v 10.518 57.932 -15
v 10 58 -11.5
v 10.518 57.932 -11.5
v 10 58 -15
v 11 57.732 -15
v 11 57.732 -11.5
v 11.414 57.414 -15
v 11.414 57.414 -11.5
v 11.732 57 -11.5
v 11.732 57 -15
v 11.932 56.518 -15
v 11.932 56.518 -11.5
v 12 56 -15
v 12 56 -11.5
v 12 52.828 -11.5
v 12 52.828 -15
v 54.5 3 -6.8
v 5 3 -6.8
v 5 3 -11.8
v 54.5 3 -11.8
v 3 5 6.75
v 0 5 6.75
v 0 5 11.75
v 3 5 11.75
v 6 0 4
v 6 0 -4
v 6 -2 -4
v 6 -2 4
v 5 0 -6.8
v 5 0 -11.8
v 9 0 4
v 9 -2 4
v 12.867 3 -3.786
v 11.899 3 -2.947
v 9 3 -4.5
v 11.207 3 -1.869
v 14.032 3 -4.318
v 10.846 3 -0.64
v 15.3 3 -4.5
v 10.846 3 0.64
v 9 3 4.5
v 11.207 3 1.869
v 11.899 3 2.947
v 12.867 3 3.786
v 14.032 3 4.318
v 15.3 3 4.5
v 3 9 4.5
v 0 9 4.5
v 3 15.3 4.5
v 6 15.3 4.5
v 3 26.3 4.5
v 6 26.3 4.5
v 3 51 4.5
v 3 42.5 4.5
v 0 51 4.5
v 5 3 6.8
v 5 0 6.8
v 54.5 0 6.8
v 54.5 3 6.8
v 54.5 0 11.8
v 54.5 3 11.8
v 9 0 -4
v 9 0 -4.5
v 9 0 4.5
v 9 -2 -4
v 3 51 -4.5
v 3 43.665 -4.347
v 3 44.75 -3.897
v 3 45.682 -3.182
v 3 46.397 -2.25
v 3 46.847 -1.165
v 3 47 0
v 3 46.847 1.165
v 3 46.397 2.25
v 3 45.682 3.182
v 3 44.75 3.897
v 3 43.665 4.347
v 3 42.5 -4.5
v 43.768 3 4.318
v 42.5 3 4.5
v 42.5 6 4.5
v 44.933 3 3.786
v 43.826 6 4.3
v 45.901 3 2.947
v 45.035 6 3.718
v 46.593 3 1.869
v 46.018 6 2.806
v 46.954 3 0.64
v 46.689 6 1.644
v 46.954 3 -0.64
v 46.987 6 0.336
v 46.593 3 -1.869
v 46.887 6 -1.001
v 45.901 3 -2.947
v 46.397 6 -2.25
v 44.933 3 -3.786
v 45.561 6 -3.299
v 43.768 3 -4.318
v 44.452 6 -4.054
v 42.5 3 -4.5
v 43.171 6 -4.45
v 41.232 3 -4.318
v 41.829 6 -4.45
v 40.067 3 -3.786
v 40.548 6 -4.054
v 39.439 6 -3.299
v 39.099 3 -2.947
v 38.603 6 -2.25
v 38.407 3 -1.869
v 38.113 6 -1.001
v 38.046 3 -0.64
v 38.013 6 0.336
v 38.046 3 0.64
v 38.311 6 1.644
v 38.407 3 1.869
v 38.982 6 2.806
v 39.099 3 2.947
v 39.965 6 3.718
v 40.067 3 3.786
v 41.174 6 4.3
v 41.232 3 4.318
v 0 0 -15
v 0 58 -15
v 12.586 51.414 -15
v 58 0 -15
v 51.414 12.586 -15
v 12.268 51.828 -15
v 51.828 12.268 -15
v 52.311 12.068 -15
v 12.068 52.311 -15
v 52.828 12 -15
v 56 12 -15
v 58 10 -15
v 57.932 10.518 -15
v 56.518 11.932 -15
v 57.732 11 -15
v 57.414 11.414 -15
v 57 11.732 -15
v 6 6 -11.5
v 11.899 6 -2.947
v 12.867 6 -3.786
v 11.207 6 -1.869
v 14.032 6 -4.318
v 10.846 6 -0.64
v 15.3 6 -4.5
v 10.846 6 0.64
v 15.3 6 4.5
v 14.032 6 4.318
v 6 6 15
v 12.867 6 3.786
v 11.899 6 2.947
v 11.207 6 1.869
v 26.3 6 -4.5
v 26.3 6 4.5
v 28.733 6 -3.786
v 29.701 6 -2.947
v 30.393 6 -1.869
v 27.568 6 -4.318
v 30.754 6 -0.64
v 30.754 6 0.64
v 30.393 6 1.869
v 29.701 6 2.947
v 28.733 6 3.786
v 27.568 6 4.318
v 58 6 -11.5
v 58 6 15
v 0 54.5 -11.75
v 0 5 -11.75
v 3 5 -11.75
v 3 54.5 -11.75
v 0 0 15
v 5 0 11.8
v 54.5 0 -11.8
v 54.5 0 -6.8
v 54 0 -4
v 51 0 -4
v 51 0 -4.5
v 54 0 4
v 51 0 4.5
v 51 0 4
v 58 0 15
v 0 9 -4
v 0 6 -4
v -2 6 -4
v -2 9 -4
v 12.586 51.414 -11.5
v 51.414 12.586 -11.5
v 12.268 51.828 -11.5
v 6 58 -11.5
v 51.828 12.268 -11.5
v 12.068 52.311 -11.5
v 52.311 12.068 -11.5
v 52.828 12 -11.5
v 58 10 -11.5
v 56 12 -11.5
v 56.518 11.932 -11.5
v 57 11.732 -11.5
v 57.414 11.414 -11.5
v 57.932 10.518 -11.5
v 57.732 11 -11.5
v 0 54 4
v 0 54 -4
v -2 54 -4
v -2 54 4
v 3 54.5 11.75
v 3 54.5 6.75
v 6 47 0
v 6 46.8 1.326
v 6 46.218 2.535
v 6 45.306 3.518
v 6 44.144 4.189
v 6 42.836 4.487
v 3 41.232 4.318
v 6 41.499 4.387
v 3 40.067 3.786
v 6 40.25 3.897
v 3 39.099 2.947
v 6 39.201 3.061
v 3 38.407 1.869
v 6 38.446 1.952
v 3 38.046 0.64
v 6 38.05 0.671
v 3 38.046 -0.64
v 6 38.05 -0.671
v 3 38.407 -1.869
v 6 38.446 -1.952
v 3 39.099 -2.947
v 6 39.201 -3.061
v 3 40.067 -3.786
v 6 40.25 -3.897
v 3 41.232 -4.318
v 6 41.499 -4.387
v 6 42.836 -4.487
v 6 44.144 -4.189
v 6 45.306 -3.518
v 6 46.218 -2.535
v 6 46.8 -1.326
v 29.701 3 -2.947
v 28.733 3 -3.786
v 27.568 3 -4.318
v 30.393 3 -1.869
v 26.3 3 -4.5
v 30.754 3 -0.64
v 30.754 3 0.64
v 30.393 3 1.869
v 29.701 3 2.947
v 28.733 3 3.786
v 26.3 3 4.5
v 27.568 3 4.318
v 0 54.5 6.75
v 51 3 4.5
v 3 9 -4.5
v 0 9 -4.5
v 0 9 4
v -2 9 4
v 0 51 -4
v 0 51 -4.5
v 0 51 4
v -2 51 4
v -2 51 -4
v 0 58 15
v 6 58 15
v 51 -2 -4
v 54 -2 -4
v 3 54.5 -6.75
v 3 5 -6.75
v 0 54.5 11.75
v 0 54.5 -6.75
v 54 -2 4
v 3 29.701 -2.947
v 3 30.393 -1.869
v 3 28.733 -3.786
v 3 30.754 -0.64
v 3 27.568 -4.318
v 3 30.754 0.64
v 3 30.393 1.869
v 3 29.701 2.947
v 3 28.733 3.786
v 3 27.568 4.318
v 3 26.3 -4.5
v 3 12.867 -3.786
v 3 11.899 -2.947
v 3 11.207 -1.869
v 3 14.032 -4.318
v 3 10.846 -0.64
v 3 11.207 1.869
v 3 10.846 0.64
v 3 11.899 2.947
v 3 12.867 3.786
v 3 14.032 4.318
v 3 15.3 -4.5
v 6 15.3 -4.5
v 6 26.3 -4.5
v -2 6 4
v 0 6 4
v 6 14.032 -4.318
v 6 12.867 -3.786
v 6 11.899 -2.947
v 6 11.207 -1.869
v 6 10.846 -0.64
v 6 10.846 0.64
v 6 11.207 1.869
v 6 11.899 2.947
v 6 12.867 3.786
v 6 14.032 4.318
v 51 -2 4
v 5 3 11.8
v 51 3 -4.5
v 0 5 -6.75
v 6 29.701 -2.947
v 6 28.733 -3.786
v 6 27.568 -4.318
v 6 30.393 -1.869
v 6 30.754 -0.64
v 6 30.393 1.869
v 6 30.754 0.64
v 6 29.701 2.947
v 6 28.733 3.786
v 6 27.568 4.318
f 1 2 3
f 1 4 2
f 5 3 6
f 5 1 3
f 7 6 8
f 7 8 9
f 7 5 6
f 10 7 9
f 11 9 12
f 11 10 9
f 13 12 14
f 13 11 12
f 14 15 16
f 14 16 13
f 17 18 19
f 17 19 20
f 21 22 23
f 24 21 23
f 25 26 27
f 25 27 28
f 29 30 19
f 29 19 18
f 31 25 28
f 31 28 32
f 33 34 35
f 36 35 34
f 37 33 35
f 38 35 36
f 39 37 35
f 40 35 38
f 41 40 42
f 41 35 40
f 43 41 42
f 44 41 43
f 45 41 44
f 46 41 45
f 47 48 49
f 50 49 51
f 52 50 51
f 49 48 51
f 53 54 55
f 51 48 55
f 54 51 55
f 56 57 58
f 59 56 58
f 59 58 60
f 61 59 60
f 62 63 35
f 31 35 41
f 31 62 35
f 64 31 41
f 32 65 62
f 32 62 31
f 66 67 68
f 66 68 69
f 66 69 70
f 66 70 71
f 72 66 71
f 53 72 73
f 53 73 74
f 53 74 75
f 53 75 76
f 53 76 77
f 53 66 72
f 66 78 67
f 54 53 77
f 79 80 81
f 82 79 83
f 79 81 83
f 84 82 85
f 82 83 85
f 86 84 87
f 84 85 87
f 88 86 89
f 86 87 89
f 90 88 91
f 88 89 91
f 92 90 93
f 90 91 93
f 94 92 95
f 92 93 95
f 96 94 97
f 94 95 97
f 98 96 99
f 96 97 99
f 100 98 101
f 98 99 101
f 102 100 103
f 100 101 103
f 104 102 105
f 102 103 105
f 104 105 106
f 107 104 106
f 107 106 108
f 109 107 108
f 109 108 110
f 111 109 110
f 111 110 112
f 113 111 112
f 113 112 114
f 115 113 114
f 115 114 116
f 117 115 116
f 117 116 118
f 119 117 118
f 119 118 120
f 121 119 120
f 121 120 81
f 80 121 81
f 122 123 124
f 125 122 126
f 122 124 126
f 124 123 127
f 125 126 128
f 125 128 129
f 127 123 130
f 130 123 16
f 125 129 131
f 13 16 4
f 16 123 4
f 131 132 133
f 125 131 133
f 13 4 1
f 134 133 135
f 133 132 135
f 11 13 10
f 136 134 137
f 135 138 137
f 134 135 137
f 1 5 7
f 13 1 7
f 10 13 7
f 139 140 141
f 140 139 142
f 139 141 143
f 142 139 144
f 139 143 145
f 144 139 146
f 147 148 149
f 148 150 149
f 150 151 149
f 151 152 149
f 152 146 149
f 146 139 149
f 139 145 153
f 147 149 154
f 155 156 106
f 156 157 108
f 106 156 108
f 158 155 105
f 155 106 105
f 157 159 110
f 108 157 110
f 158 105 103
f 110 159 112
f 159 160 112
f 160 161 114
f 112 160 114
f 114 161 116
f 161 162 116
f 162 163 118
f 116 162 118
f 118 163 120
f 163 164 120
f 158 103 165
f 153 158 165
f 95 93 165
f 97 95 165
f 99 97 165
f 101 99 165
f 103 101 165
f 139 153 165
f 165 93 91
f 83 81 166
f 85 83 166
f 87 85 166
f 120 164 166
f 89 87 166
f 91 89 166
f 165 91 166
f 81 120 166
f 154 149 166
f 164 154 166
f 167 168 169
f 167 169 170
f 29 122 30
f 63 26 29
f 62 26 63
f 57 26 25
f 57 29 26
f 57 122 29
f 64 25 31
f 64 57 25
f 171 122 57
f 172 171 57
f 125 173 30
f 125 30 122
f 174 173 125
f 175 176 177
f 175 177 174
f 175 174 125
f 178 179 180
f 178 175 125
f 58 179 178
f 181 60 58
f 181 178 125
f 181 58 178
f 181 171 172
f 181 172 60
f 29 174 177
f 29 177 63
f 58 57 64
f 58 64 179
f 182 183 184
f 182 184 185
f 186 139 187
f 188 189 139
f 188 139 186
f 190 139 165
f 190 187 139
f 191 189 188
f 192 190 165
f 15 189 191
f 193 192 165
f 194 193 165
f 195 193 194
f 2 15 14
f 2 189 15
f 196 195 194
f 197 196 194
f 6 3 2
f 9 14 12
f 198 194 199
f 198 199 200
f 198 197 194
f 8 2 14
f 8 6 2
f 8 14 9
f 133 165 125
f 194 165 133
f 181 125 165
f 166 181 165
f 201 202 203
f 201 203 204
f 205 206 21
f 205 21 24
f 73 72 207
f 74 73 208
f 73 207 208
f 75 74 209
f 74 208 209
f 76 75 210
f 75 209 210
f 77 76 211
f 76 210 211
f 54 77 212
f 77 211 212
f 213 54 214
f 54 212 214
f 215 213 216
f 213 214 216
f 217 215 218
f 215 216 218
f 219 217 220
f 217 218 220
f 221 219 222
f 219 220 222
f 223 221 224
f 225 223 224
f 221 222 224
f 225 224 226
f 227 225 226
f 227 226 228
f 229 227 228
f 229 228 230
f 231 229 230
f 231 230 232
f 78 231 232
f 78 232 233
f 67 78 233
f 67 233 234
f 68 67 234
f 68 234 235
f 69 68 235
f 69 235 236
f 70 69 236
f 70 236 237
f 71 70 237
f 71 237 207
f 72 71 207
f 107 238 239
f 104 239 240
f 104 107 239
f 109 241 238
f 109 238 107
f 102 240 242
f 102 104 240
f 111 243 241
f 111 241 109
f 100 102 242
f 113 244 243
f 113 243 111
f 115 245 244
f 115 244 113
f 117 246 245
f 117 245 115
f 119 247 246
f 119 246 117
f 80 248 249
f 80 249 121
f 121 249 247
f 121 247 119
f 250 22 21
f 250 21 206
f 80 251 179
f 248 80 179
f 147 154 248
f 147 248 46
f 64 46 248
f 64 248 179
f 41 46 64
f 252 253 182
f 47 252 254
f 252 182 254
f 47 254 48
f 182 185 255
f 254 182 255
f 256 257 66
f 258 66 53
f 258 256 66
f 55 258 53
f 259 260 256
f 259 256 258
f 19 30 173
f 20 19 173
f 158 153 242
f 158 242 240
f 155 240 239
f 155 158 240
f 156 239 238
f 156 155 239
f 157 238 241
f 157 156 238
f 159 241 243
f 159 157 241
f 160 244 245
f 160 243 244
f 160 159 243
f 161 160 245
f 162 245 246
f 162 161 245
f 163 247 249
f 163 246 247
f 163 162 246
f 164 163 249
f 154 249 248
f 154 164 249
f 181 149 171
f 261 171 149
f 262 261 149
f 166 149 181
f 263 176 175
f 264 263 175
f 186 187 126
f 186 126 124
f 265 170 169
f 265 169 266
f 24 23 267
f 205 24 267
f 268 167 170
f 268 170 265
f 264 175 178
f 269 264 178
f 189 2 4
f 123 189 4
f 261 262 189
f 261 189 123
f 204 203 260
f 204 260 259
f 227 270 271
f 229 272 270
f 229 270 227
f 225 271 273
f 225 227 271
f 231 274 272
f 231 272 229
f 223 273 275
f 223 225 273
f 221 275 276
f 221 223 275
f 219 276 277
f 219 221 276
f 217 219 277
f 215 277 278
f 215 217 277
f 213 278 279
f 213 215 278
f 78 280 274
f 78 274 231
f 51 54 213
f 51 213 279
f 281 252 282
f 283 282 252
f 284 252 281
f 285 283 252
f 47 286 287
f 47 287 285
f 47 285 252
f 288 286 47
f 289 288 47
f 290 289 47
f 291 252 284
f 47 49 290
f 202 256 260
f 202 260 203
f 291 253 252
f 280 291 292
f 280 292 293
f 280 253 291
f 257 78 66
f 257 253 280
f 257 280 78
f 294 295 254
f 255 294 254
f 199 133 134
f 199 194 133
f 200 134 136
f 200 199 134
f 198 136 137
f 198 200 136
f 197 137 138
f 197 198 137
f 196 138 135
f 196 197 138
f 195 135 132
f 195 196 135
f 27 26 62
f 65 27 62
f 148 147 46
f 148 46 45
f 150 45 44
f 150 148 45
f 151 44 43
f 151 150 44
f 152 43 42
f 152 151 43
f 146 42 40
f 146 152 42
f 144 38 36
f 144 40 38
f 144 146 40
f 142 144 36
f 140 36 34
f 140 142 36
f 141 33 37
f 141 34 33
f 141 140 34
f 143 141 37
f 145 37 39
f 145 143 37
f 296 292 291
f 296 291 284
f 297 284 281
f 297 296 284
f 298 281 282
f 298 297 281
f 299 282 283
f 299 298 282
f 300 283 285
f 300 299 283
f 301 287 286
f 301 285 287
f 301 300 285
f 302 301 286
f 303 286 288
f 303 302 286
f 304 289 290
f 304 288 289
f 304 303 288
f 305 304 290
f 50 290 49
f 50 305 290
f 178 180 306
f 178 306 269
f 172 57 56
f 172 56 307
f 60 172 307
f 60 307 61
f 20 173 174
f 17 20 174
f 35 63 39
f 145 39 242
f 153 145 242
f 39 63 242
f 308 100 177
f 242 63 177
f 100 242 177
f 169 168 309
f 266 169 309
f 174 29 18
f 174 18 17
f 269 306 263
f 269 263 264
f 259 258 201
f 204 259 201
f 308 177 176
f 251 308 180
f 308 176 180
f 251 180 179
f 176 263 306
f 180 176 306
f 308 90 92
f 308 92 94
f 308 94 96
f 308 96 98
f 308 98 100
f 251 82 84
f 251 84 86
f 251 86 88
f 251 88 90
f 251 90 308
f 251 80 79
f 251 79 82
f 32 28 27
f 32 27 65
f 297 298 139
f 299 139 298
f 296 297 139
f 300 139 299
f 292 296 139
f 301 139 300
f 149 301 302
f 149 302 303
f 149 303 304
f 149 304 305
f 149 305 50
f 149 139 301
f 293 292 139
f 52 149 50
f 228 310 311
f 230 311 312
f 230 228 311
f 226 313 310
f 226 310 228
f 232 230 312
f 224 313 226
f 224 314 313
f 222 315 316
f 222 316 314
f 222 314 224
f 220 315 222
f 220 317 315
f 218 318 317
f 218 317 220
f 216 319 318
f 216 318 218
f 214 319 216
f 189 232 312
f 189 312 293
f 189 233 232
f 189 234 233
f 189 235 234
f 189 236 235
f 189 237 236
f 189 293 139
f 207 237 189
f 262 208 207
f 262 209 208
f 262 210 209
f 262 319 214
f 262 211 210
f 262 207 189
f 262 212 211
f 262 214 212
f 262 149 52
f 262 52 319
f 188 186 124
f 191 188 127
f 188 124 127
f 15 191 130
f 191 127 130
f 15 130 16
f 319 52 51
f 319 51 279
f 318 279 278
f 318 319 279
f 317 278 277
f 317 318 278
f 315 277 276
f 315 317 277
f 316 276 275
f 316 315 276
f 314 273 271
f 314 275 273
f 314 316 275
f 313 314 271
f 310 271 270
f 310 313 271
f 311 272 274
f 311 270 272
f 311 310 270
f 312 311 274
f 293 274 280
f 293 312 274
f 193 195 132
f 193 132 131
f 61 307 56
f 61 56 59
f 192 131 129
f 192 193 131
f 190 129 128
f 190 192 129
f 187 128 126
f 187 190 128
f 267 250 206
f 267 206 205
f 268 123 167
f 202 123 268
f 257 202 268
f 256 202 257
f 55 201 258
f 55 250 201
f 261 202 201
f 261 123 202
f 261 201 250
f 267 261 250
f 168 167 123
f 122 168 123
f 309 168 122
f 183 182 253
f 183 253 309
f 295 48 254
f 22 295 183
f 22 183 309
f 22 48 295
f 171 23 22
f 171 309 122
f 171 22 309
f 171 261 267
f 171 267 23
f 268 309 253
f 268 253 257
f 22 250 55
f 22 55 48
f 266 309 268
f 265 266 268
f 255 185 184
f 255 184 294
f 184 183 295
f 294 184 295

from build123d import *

# Parameters (mm, degrees)
EXTRUDE_1_DEPTH      = 15
EXTRUDE_1_DEPTH_BACK = 15
SKETCH_3_W           = 52
SKETCH_3_H           = 52
CUT_EXTRUDE_1_DEPTH  = 26.5
FILLET_1_R           = 2
SKETCH_4_R           = 4.5
CUT_EXTRUDE_2_DEPTH  = 7
SKETCH_5_R           = 4.5
CUT_EXTRUDE_3_DEPTH  = 7
SKETCH_6_W           = 5
SKETCH_6_H           = 49.5
SKETCH_6_W_2         = 9
SKETCH_6_H_2         = 42
CUT_EXTRUDE_4_DEPTH  = 3
SKETCH_7_W           = 49.5
SKETCH_7_H           = 5
SKETCH_7_W_2         = 42
SKETCH_7_H_2         = 9
CUT_EXTRUDE_5_DEPTH  = 3
SKETCH_8_W           = 3
SKETCH_8_H           = 8
EXTRUDE_2_DEPTH      = 2
SKETCH_9_W           = 8
SKETCH_9_H           = 3
EXTRUDE_3_DEPTH      = 2


with BuildPart() as part:
    # Sketch 2 → Extrude 1 (new body, two sides)
    with BuildSketch(Plane.XY) as extrude_1_sk:
        Polygon((0, 58), (0, 0), (58, 0), (58, 12), (52, 12), (12, 52), (12, 58), align=None)
    extrude(amount=EXTRUDE_1_DEPTH)
    extrude(extrude_1_sk.sketch, amount=-EXTRUDE_1_DEPTH_BACK)

    # Sketch 3 → Cut-Extrude 1 (cut)
    with BuildSketch(Plane.XY.offset(15)):
        with Locations((32, 32)):
            Rectangle(SKETCH_3_W, SKETCH_3_H)
    extrude(amount=-CUT_EXTRUDE_1_DEPTH, mode=Mode.SUBTRACT)

    # Fillet 1
    fillet_1_edges = [part.edges().sort_by_distance(p)[0] for p in [
        (12, 58, -13.25),
        (12, 52, -13.25),
        (52, 12, -13.25),
        (58, 12, -13.25),
    ]]
    fillet(fillet_1_edges, radius=FILLET_1_R)

    # Sketch 4 → Cut-Extrude 2 (cut, through all)
    with BuildSketch(Plane(origin=(6, 0, 0), x_dir=(0, 0, -1), z_dir=(1, 0, 0))):
        with Locations(Location((0, 42.5, 0), (0, 0, 90))):  # turned: the seam where the file's is
            Circle(SKETCH_4_R)
        with BuildLine():
            Line((4.5, 26.3), (4.5, 15.3))
            ThreePointArc((4.5, 15.3), (0, 10.8), (-4.5, 15.3))
            Line((-4.5, 15.3), (-4.5, 26.3))
            ThreePointArc((-4.5, 26.3), (0, 30.8), (4.5, 26.3))
        make_face()
    extrude(amount=-CUT_EXTRUDE_2_DEPTH, mode=Mode.SUBTRACT)

    # Sketch 5 → Cut-Extrude 3 (cut, through all)
    with BuildSketch(Plane(origin=(0, 6, 0), x_dir=(1, 0, 0), z_dir=(0, 1, 0))):
        with Locations(Location((42.5, 0, 0), (0, 0, 270))):  # turned: the seam where the file's is
            Circle(SKETCH_5_R)
        with BuildLine():
            Line((15.3, 4.5), (26.3, 4.5))
            ThreePointArc((26.3, 4.5), (30.8, 0), (26.3, -4.5))
            Line((26.3, -4.5), (15.3, -4.5))
            ThreePointArc((15.3, -4.5), (10.8, 0), (15.3, 4.5))
        make_face()
    extrude(amount=-CUT_EXTRUDE_3_DEPTH, mode=Mode.SUBTRACT)

    # Sketch 6 → Cut-Extrude 4 (cut)
    with BuildSketch(Plane.ZY):
        with Locations((-9.25, 29.75)):
            Rectangle(SKETCH_6_W, SKETCH_6_H)
        with Locations((9.25, 29.75)):
            Rectangle(SKETCH_6_W, SKETCH_6_H)
        with Locations((0, 30)):
            Rectangle(SKETCH_6_W_2, SKETCH_6_H_2)
    extrude(amount=-CUT_EXTRUDE_4_DEPTH, mode=Mode.SUBTRACT)

    # Sketch 7 → Cut-Extrude 5 (cut)
    with BuildSketch(Plane.XZ):
        with Locations((29.75, 9.3)):
            Rectangle(SKETCH_7_W, SKETCH_7_H)
        with Locations((29.75, -9.3)):
            Rectangle(SKETCH_7_W, SKETCH_7_H)
        with Locations((30, 0)):
            Rectangle(SKETCH_7_W_2, SKETCH_7_H_2)
    extrude(amount=-CUT_EXTRUDE_5_DEPTH, mode=Mode.SUBTRACT)

    # Sketch 8 → Extrude 2 (add)
    with BuildSketch(Plane.XZ):
        with Locations((7.5, 0)):
            Rectangle(SKETCH_8_W, SKETCH_8_H)
        with Locations((52.5, 0)):
            Rectangle(SKETCH_8_W, SKETCH_8_H)
    extrude(amount=EXTRUDE_2_DEPTH)

    # Sketch 9 → Extrude 3 (add)
    with BuildSketch(Plane.ZY):
        with Locations((0, 52.5)):
            Rectangle(SKETCH_9_W, SKETCH_9_H)
        with Locations((0, 7.5)):
            Rectangle(SKETCH_9_W, SKETCH_9_H)
    extrude(amount=EXTRUDE_3_DEPTH)


solid = part.part
